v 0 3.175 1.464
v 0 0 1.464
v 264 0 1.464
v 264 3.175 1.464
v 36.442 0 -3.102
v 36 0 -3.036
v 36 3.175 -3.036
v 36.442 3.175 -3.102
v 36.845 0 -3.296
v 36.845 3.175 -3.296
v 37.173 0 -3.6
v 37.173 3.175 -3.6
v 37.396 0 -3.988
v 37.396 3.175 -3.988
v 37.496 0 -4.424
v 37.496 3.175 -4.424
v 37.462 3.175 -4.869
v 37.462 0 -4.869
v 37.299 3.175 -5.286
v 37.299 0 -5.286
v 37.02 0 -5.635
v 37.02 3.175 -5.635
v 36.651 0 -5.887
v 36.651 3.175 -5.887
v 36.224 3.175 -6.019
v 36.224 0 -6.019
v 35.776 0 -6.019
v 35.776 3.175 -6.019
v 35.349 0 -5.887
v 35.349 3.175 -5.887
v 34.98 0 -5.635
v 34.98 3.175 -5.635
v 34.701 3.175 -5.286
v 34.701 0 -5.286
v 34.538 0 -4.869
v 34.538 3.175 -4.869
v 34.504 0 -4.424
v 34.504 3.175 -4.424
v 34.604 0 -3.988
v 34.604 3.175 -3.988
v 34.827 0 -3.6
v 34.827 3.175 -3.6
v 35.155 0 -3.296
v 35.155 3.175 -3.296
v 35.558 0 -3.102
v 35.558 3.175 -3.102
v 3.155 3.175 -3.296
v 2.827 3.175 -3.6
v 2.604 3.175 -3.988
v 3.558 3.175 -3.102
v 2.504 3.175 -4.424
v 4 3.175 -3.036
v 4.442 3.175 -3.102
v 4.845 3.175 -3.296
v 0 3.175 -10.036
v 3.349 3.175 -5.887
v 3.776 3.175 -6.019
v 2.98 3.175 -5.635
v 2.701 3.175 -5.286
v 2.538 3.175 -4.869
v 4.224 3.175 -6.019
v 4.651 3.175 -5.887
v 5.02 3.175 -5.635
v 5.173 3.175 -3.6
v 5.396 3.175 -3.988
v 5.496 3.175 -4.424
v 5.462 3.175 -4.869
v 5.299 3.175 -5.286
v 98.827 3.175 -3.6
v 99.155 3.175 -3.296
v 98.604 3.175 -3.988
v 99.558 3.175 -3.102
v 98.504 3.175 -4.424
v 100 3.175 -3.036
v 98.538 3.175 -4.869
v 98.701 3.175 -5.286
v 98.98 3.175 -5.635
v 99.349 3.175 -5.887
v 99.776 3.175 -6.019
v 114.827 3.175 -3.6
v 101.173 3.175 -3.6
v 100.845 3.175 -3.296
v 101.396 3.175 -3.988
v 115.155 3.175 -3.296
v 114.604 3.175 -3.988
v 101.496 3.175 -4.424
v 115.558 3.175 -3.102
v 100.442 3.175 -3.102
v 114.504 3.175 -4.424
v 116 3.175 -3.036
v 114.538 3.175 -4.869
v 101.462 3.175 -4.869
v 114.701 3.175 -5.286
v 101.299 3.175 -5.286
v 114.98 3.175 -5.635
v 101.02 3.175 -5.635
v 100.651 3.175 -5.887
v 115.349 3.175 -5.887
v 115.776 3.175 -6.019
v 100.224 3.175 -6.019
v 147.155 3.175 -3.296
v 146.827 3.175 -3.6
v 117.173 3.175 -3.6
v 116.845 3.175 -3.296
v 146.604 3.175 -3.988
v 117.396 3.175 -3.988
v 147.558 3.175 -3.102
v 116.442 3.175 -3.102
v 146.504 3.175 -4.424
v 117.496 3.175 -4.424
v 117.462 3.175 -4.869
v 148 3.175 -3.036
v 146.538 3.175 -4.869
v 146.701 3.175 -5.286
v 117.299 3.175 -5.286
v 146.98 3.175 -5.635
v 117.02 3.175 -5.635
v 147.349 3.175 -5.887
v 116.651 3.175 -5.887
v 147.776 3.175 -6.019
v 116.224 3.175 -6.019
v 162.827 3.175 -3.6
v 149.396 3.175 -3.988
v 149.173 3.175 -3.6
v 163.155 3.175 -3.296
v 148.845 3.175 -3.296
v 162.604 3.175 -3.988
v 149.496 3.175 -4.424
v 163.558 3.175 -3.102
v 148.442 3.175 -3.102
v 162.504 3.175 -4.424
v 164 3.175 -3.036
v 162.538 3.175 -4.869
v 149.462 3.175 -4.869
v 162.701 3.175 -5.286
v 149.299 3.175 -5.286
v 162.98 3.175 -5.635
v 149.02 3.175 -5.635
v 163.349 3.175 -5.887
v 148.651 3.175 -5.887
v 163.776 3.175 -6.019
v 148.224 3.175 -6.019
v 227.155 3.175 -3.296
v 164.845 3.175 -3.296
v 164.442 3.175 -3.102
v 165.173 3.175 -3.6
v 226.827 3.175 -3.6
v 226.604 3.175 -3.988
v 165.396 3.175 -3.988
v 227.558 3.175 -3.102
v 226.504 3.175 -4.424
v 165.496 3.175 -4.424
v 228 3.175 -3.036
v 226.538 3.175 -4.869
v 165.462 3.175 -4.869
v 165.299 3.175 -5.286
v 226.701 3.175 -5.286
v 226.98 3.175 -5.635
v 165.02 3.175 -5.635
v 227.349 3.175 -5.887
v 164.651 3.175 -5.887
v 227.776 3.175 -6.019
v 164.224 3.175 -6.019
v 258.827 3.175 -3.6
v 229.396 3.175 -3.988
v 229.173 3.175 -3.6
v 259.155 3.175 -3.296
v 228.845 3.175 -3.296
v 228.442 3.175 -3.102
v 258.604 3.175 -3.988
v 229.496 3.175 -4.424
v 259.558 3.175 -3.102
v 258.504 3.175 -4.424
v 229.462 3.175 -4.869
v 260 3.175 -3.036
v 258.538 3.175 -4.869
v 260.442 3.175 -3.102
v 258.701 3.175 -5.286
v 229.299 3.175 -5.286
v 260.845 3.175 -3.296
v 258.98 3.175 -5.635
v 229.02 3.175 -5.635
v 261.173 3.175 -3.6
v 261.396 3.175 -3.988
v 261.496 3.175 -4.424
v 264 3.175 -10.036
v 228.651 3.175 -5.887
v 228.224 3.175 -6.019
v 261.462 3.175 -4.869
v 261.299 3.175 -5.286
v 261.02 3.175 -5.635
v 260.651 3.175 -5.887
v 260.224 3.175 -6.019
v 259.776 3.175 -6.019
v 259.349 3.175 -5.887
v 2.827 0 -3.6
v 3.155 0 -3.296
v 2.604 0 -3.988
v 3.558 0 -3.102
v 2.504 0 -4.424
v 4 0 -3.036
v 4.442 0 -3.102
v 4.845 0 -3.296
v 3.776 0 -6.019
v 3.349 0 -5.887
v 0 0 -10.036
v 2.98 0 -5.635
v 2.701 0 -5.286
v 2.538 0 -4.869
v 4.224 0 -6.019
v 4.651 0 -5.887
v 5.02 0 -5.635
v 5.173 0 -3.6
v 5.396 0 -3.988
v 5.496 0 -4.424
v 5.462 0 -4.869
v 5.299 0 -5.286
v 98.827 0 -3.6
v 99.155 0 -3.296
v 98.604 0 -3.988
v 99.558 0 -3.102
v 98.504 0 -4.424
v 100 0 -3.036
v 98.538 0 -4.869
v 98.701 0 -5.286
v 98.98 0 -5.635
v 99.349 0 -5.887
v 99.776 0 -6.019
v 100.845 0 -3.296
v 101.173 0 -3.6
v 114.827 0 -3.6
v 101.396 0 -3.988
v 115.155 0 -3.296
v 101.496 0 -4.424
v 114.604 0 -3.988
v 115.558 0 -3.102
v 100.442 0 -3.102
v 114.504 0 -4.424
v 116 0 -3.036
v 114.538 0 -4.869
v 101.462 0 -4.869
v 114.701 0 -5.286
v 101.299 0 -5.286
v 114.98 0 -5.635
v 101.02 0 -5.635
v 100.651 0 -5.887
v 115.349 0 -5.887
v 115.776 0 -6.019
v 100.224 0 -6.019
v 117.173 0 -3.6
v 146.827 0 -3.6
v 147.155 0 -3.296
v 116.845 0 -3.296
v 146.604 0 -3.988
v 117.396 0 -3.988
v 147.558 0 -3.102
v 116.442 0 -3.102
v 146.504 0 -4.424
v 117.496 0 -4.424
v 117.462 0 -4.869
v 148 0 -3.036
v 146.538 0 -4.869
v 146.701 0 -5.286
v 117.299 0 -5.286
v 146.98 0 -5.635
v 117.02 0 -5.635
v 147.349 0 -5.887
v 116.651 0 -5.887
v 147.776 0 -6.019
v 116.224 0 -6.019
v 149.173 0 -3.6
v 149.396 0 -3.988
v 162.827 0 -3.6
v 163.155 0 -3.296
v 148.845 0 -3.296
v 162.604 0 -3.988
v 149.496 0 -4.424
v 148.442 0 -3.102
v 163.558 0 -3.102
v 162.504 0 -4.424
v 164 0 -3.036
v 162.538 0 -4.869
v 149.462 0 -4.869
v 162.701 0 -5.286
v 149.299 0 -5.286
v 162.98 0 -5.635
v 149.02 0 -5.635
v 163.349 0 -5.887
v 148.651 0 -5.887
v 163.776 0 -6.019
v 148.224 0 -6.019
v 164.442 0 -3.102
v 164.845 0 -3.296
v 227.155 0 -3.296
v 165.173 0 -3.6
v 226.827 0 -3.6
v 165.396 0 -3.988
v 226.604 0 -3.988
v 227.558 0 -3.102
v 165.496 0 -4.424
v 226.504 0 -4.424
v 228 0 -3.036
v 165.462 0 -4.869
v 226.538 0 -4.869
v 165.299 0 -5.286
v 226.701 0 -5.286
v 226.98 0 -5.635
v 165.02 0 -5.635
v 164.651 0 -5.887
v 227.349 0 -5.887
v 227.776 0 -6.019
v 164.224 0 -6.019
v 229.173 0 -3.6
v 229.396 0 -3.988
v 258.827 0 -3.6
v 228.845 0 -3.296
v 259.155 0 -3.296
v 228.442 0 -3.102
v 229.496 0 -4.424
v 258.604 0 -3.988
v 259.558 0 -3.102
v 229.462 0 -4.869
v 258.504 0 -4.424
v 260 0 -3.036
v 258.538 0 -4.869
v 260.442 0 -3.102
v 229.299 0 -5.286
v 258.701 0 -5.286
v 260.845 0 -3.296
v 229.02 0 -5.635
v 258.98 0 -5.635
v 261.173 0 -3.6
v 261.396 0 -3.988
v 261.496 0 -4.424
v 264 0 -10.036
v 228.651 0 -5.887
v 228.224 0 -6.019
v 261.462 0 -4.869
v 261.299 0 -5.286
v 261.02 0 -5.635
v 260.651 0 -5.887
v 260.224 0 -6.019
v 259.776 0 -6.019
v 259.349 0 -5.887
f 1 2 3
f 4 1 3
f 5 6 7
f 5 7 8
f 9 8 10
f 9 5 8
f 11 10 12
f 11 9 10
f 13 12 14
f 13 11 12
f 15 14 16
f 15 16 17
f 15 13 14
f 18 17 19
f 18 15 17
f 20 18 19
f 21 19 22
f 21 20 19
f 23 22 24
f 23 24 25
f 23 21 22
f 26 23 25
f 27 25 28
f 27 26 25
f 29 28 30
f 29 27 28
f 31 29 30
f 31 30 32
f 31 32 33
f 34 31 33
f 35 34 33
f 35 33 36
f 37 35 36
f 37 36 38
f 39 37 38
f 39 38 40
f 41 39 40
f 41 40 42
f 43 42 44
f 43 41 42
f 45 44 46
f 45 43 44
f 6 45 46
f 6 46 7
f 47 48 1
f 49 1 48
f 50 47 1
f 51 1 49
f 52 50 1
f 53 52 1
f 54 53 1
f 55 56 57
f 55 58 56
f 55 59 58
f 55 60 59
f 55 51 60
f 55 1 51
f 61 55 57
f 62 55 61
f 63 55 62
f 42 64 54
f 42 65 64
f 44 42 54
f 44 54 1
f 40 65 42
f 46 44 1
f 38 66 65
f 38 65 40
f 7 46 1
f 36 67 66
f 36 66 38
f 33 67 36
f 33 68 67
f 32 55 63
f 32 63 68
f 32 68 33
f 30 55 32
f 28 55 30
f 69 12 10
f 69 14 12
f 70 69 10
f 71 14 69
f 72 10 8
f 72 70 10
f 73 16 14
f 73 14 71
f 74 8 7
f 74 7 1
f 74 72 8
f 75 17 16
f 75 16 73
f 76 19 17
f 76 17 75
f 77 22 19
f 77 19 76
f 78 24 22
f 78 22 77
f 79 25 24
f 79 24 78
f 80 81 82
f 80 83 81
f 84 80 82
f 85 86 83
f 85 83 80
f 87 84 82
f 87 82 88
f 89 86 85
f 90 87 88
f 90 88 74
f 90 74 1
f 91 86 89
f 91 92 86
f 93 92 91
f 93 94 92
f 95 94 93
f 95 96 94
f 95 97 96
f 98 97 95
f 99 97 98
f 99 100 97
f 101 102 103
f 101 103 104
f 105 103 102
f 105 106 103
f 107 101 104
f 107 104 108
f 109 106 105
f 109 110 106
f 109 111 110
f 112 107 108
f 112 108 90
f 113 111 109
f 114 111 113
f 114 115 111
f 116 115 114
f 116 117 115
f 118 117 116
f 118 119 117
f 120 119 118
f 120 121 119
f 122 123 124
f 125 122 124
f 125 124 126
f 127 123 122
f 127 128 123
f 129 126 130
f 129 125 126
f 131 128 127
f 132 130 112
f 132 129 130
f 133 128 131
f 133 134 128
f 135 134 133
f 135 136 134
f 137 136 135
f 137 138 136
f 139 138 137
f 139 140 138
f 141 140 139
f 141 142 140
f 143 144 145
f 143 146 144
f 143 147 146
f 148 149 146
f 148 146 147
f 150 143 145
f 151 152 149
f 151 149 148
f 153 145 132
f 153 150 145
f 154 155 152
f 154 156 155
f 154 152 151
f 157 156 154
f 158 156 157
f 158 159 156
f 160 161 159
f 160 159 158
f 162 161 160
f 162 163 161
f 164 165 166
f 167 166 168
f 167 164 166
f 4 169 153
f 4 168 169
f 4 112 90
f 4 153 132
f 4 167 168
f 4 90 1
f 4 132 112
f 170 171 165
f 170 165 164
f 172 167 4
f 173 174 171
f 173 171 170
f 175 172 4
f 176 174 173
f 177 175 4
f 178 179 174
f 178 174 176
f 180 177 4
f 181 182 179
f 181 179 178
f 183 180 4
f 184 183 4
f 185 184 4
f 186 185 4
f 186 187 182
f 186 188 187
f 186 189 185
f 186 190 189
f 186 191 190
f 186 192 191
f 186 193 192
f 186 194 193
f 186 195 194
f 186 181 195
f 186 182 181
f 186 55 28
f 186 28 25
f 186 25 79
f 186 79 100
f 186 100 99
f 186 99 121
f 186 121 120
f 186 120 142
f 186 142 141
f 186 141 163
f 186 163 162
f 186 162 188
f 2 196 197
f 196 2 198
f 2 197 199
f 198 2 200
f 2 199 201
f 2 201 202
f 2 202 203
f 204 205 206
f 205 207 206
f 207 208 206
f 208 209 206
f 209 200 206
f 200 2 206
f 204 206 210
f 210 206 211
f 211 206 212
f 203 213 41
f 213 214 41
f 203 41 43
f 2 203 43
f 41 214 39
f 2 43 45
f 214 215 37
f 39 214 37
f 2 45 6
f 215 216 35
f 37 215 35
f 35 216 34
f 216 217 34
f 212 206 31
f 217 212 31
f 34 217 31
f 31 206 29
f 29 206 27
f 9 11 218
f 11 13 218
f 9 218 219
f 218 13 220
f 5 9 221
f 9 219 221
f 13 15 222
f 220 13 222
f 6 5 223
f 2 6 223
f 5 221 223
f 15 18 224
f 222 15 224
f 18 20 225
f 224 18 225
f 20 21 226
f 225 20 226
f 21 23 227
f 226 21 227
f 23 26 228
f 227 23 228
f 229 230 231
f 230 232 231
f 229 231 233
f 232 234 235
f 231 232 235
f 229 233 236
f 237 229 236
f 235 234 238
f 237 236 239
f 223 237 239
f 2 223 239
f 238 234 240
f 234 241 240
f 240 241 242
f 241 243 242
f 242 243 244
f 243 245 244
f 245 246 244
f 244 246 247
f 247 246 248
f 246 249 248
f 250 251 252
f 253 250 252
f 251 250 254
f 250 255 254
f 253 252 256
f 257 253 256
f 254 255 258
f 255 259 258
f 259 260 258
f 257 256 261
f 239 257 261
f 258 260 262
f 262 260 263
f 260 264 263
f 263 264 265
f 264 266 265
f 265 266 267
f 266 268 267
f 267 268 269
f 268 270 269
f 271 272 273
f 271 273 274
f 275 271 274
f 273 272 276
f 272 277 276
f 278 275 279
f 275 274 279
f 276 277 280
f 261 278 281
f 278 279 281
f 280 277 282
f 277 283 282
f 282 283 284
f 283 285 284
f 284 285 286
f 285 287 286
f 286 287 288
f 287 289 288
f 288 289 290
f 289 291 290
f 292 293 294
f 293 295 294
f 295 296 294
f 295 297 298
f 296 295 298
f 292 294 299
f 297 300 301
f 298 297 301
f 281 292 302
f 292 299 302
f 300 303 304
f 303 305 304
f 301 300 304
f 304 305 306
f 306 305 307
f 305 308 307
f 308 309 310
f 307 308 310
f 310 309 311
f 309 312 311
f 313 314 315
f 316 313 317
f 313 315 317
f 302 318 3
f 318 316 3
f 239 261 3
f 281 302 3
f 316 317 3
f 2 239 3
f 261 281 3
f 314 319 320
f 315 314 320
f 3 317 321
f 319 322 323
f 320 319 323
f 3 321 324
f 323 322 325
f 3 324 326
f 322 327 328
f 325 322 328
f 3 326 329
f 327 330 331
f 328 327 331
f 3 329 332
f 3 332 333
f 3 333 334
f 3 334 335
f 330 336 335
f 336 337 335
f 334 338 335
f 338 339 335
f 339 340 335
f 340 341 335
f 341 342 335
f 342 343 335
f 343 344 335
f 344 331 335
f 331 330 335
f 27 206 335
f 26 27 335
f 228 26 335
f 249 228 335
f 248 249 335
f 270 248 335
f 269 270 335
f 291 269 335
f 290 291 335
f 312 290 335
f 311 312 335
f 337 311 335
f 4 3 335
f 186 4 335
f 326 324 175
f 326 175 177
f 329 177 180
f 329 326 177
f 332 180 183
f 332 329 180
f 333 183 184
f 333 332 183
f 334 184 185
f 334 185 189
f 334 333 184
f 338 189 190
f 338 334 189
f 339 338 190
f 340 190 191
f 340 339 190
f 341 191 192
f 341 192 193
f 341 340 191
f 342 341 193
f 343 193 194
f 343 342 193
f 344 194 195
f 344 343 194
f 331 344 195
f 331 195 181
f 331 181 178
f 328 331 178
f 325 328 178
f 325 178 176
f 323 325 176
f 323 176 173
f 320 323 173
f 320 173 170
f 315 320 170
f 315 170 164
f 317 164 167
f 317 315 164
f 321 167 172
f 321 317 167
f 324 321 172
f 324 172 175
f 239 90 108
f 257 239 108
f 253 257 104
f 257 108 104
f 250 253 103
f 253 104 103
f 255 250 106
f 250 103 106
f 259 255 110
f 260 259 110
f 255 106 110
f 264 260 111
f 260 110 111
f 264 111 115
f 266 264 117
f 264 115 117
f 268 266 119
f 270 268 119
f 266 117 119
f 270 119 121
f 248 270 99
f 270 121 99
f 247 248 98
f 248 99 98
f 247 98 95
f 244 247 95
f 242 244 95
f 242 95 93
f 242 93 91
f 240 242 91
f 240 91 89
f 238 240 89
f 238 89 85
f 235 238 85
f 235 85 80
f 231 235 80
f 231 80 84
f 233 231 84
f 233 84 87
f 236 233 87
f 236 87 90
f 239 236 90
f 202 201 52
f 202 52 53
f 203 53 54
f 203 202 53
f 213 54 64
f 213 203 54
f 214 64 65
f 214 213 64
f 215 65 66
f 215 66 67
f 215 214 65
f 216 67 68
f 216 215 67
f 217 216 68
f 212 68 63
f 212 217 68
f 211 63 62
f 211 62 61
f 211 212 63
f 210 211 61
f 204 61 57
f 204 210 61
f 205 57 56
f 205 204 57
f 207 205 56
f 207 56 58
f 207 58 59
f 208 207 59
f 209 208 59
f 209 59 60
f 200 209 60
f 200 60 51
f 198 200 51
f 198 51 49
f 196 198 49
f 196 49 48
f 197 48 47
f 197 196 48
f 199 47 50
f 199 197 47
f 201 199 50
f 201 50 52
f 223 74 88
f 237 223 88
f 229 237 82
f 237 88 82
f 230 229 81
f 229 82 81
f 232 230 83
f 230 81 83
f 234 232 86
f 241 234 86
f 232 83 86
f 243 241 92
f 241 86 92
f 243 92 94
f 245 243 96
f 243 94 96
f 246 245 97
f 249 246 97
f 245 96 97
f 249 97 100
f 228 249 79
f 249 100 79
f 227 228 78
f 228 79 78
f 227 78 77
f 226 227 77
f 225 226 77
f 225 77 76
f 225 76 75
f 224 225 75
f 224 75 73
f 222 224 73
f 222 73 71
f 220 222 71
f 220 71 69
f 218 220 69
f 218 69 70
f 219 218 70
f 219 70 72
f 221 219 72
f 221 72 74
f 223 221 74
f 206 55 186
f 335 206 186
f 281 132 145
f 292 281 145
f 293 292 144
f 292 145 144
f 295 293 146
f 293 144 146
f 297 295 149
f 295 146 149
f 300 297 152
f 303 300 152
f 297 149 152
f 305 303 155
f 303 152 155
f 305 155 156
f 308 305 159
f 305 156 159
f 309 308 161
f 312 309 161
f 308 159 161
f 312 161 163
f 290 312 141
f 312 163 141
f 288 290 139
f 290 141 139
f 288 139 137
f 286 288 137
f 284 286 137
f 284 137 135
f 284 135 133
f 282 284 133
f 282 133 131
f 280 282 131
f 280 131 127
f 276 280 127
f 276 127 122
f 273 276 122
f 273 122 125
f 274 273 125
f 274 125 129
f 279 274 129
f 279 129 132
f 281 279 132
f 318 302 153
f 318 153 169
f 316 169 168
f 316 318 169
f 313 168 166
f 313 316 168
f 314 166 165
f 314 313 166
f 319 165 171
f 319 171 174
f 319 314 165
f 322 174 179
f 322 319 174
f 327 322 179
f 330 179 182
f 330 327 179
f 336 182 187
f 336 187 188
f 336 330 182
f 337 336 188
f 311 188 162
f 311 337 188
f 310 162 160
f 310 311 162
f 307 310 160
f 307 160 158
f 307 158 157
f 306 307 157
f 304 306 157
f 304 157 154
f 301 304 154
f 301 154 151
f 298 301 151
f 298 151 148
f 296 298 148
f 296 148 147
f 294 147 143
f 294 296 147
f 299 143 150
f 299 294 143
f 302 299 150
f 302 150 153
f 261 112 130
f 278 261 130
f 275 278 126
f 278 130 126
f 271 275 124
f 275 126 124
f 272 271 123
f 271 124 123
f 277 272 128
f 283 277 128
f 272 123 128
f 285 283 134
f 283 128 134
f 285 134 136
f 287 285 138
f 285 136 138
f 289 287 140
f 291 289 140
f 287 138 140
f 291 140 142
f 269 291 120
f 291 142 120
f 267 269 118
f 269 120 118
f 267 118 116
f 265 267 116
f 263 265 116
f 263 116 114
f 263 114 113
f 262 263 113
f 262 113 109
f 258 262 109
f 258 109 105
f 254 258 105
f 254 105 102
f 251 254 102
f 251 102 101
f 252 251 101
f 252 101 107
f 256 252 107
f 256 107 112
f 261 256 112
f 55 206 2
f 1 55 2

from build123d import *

# Parameters (mm, degrees)
SKETCH1_R           = 1.5
SKETCH1_R_2         = 2
BOSS_EXTRUDE1_DEPTH = 3.175
SKETCH2_R           = 1.5
CUT_EXTRUDE1_DEPTH  = 10
SKETCH3_W           = 264
SKETCH3_H           = 13.5
CUT_EXTRUDE2_DEPTH  = 10
SKETCH4_W           = 264
SKETCH4_H           = 2
CUT_EXTRUDE3_DEPTH  = 10


with BuildPart() as part:
    # Sketch1 → Boss-Extrude1 (new body)
    with BuildSketch(Plane(origin=(0, 0, 0), x_dir=(1, 0, 0), z_dir=(0, 1, 0))):
        Polygon((0, -1.464365857), (264, -1.464365857), (264, 4.535634143), (264, 25.535634143), (0, 25.535634143), align=None)
        with Locations(Location((4, 4.535634143, 0), (0, 0, 270))):
            Circle(SKETCH1_R, mode=Mode.SUBTRACT)
        with Locations(Location((36, 4.535634143, 0), (0, 0, 270))):
            Circle(SKETCH1_R, mode=Mode.SUBTRACT)
        with Locations(Location((228, 4.535634143, 0), (0, 0, 270))):
            Circle(SKETCH1_R, mode=Mode.SUBTRACT)
        with Locations(Location((260, 4.535634143, 0), (0, 0, 270))):
            Circle(SKETCH1_R, mode=Mode.SUBTRACT)
        with Locations(Location((68, 21.535634143, 0), (0, 0, 270))):
            Circle(SKETCH1_R_2, mode=Mode.SUBTRACT)
        with Locations(Location((100, 21.535634143, 0), (0, 0, 270))):
            Circle(SKETCH1_R_2, mode=Mode.SUBTRACT)
        with Locations(Location((132, 21.535634143, 0), (0, 0, 270))):
            Circle(SKETCH1_R_2, mode=Mode.SUBTRACT)
        with Locations(Location((164, 21.535634143, 0), (0, 0, 270))):
            Circle(SKETCH1_R_2, mode=Mode.SUBTRACT)
        with Locations(Location((196, 21.535634143, 0), (0, 0, 270))):
            Circle(SKETCH1_R_2, mode=Mode.SUBTRACT)
    extrude(amount=BOSS_EXTRUDE1_DEPTH)

    # Sketch2 → Cut-Extrude1 (cut)
    with BuildSketch(Plane(origin=(0, 3.175, 0), x_dir=(1, 0, 0), z_dir=(0, 1, 0))):
        with Locations(Location((116, 4.535634143, 0), (0, 0, 270))):
            Circle(SKETCH2_R)
        with Locations(Location((148, 4.535634143, 0), (0, 0, 270))):
            Circle(SKETCH2_R)
        with Locations(Location((100, 4.535634143, 0), (0, 0, 270))):
            Circle(SKETCH2_R)
        with Locations(Location((164, 4.535634143, 0), (0, 0, 270))):
            Circle(SKETCH2_R)
    extrude(amount=-CUT_EXTRUDE1_DEPTH, mode=Mode.SUBTRACT)

    # Sketch3 → Cut-Extrude2 (cut)
    with BuildSketch(Plane(origin=(0, 3.175, 0), x_dir=(1, 0, 0), z_dir=(0, 1, 0))):
        with Locations((132, 18.785634143)):
            Rectangle(SKETCH3_W, SKETCH3_H)
    extrude(amount=-CUT_EXTRUDE2_DEPTH, mode=Mode.SUBTRACT)

    # Sketch4 → Cut-Extrude3 (cut)
    with BuildSketch(Plane(origin=(0, 3.175, 0), x_dir=(1, 0, 0), z_dir=(0, 1, 0))):
        with Locations((132, 11.035634143)):
            Rectangle(SKETCH4_W, SKETCH4_H)
    extrude(amount=-CUT_EXTRUDE3_DEPTH, mode=Mode.SUBTRACT)


solid = part.part
